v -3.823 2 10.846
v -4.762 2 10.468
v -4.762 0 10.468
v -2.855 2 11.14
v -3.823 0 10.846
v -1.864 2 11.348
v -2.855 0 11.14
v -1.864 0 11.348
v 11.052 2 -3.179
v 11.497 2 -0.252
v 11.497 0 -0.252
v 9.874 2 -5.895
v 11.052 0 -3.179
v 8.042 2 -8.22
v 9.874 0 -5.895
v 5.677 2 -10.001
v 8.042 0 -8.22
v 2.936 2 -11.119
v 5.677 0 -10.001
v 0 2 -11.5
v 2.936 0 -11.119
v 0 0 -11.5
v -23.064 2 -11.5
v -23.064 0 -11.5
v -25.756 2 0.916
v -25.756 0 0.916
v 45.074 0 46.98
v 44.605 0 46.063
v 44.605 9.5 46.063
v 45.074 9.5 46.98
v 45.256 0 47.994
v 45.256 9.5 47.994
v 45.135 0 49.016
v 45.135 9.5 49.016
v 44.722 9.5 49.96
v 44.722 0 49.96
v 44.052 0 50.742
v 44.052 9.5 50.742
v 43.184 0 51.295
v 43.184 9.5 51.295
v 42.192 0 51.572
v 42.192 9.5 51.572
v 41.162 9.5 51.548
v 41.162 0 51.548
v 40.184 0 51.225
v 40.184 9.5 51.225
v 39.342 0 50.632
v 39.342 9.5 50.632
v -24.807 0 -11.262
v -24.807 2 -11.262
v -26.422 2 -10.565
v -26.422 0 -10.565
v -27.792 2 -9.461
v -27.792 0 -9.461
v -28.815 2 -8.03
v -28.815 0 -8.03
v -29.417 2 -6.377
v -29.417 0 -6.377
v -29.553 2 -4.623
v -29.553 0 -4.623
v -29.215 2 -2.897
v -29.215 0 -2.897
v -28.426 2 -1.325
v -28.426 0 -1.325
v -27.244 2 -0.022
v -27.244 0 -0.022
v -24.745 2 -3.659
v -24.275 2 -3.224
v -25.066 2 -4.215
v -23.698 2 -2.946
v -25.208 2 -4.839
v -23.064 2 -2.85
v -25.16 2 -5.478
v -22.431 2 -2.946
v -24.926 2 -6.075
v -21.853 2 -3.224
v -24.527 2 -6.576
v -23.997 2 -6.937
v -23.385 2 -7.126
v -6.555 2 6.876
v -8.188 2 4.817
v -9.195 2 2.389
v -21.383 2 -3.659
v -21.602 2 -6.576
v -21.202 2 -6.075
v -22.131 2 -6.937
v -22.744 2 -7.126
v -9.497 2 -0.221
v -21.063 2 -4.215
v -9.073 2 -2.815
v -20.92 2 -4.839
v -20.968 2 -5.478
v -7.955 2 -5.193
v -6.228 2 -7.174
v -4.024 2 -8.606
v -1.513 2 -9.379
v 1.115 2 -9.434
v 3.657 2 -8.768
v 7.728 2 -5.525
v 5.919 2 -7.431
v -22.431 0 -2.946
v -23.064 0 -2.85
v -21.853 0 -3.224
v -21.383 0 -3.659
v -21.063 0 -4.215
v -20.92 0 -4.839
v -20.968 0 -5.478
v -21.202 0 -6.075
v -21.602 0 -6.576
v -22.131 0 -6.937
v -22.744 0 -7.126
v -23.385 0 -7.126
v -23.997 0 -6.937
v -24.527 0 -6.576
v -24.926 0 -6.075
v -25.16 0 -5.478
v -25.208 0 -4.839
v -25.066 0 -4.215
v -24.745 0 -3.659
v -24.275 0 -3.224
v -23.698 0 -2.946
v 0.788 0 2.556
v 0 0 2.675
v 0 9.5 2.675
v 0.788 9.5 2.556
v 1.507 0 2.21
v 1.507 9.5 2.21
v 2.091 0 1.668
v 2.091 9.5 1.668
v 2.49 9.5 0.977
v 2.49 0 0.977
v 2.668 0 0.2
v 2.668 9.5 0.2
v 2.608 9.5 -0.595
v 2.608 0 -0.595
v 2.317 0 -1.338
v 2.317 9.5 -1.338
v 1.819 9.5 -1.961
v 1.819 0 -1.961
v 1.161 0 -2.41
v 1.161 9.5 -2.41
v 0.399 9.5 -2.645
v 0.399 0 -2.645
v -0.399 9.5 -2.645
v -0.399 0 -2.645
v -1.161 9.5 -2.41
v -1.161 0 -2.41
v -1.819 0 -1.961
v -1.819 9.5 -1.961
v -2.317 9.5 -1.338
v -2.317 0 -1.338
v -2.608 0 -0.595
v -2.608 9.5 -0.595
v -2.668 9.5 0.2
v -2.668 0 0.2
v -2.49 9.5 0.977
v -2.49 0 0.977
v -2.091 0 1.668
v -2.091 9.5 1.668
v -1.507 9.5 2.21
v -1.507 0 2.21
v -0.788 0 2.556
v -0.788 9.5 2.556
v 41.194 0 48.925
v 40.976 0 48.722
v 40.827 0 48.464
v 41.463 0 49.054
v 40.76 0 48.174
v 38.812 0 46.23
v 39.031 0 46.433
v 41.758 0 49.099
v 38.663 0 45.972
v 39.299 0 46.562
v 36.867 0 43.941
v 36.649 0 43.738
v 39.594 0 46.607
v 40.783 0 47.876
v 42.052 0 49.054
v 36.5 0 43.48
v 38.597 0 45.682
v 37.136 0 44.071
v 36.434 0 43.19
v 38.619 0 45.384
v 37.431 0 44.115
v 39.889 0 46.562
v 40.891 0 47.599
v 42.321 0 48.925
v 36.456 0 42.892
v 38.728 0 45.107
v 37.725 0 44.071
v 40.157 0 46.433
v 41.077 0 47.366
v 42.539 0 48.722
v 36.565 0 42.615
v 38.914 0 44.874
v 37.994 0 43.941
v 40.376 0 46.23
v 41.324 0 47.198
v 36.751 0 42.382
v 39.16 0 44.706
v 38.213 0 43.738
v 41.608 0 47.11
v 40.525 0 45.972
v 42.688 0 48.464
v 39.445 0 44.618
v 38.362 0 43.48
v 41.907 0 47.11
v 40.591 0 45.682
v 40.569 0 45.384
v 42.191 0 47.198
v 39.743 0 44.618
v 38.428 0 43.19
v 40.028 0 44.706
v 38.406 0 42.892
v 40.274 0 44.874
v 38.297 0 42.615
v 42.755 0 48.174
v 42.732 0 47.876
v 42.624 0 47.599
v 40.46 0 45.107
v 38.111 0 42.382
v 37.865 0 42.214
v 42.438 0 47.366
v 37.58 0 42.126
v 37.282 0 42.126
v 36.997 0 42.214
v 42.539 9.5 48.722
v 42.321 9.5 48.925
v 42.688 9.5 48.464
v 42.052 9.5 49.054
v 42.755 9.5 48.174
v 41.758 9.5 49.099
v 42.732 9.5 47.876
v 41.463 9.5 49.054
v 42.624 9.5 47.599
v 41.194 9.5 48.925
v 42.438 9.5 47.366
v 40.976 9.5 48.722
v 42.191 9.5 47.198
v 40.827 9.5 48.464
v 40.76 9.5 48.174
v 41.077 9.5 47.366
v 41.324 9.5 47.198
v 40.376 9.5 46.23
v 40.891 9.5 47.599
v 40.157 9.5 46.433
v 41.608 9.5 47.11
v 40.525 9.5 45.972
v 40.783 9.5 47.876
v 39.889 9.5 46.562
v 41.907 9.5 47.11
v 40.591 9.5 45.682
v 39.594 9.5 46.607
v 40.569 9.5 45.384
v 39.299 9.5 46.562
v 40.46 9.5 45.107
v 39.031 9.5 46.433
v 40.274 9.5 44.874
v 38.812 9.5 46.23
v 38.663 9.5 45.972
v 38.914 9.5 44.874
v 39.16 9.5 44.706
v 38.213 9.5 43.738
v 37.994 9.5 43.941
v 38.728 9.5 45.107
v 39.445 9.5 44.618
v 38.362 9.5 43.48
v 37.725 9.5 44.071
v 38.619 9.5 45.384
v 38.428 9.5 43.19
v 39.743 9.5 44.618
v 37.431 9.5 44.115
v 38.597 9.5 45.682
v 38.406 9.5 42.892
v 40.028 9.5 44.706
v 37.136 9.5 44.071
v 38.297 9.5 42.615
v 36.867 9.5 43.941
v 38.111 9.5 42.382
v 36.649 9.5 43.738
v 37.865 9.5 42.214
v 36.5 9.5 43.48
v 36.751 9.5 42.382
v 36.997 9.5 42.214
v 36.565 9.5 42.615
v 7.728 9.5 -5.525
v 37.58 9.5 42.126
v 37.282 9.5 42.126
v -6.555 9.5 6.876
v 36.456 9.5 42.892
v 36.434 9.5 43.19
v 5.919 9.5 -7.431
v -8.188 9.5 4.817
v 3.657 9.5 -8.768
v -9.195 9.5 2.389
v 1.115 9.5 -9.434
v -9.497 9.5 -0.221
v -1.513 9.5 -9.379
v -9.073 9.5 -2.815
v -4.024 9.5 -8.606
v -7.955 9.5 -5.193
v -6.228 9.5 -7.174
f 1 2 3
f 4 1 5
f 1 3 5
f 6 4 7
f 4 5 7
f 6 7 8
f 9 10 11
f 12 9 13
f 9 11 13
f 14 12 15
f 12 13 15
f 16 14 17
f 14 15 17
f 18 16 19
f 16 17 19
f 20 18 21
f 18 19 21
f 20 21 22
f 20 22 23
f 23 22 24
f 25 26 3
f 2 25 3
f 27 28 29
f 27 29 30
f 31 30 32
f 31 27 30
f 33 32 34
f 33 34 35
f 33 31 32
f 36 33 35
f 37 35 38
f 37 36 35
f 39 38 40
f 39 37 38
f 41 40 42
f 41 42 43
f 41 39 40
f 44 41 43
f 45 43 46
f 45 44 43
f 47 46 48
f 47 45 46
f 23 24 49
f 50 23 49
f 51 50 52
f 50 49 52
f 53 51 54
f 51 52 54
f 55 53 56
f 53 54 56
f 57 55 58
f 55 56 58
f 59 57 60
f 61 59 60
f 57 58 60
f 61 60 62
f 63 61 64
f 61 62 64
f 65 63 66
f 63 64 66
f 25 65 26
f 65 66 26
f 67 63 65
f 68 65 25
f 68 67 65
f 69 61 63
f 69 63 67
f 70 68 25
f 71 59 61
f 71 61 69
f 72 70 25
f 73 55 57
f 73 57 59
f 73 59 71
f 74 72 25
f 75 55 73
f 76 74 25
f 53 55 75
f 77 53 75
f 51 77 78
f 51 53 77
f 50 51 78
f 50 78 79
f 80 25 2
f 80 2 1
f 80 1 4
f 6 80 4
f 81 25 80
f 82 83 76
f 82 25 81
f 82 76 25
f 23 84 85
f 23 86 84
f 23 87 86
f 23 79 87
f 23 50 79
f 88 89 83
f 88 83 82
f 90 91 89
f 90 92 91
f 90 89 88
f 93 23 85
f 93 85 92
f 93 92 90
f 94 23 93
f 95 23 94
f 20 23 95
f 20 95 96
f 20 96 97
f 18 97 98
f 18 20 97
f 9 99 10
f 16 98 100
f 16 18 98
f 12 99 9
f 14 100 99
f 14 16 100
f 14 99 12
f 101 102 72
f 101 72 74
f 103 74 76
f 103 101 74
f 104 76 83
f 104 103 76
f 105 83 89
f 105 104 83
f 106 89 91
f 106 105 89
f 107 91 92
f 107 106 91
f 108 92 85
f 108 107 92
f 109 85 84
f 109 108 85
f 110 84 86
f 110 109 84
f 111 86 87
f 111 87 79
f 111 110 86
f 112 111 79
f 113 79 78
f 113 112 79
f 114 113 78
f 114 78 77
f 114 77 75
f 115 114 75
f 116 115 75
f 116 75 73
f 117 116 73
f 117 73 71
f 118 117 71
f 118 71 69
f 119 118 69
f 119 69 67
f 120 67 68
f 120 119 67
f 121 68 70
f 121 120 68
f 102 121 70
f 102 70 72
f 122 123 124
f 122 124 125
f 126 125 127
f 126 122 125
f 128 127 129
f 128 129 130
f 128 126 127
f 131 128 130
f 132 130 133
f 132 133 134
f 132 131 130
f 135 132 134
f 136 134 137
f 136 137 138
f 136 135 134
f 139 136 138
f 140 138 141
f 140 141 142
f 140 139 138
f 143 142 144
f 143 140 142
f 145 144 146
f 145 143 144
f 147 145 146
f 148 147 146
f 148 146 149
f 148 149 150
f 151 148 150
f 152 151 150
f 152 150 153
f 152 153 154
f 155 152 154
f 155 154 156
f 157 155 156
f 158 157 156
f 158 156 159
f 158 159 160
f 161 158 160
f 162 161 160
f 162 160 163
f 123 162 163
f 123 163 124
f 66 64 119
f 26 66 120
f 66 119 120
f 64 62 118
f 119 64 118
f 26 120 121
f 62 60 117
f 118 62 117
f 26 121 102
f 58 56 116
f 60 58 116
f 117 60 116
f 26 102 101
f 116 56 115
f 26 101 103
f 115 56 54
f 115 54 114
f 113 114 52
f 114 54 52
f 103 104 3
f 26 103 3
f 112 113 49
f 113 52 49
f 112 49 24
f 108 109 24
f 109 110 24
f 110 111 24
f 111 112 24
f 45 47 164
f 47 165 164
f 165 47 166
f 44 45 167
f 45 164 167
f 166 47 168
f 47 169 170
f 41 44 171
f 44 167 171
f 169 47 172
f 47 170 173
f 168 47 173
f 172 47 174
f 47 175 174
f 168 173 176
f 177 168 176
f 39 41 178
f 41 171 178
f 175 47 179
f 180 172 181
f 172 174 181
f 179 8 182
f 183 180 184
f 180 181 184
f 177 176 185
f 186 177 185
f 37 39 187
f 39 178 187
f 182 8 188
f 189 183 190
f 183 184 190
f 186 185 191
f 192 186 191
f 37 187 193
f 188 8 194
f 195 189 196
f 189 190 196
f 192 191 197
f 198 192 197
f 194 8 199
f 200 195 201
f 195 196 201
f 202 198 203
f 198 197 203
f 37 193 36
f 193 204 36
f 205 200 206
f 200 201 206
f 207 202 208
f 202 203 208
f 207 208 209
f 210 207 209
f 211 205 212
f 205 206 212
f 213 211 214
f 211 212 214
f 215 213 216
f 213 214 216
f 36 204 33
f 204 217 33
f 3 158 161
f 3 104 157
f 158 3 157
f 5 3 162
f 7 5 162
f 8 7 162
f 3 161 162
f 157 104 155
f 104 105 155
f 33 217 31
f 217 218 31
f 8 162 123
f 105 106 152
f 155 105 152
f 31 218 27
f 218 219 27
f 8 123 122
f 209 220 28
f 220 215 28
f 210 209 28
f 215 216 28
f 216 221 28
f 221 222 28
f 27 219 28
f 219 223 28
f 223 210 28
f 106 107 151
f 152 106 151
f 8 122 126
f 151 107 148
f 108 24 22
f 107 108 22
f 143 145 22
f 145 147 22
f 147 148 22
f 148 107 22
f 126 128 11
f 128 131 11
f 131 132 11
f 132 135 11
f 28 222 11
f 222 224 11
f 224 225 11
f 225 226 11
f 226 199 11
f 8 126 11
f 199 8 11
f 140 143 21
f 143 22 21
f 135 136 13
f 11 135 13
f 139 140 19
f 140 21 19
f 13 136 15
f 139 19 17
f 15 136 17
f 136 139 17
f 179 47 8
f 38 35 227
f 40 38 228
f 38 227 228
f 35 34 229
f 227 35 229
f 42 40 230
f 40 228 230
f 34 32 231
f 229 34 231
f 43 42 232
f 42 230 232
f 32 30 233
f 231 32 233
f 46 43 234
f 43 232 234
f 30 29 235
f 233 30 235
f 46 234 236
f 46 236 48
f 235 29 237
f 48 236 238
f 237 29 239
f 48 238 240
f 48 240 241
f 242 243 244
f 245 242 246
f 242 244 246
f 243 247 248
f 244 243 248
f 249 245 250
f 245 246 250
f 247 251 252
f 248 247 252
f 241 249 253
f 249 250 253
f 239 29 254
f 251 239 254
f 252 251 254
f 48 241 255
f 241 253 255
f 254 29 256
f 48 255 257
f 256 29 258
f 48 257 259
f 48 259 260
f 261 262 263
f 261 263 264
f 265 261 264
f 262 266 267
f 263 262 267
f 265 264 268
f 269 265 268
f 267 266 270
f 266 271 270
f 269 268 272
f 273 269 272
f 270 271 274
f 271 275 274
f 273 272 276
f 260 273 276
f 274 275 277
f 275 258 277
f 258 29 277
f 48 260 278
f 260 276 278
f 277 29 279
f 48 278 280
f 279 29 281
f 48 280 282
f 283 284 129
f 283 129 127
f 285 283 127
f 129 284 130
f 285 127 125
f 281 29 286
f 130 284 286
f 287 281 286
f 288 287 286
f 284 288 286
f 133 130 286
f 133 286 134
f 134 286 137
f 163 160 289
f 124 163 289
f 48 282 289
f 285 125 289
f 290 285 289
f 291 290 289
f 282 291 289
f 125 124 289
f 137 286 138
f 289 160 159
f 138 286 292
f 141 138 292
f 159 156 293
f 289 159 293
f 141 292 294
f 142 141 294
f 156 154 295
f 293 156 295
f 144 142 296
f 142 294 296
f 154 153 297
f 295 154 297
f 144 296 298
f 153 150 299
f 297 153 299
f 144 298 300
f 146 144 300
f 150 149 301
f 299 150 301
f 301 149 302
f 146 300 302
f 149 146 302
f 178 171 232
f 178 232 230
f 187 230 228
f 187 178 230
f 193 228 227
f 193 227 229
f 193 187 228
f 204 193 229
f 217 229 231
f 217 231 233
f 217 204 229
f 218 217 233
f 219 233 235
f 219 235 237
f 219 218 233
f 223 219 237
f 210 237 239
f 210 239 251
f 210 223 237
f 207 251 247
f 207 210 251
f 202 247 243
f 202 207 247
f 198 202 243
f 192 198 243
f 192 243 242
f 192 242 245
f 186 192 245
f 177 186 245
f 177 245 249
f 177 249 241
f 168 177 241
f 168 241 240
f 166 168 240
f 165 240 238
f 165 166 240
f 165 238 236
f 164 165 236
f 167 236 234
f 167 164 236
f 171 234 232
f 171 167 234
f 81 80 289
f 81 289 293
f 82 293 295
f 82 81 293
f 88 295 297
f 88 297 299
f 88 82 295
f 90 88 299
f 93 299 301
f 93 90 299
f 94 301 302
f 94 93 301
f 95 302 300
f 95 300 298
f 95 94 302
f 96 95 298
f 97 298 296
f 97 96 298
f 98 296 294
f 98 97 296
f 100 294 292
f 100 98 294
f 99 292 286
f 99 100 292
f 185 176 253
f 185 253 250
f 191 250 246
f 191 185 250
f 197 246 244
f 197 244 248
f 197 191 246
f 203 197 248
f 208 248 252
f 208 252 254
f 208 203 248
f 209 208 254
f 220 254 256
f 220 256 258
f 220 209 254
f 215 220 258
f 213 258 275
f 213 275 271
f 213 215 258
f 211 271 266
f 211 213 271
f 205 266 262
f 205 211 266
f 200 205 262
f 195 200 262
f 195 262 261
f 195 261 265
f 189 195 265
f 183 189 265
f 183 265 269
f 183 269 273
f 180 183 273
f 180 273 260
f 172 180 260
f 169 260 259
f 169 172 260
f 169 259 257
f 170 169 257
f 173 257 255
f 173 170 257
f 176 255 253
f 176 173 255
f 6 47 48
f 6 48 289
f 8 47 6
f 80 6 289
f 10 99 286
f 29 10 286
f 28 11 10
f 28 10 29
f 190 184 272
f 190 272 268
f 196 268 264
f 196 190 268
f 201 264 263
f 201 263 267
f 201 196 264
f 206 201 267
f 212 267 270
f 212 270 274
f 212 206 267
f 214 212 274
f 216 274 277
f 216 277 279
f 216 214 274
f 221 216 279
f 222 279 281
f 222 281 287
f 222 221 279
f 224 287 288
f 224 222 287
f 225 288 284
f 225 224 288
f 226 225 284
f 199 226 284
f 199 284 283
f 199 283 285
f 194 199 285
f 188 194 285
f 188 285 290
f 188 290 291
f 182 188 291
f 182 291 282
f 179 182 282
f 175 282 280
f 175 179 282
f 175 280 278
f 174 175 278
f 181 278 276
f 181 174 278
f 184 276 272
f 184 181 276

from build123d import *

# Parameters (mm, degrees)
ESQUISSE1_R             = 2.675
ESQUISSE1_R_2           = 2.15
BOSS_EXTRU_1_DEPTH      = 2
BOSS_EXTRU_2_DEPTH      = 7.5
BOSS_EXTRU_2_DEPTH_BACK = 2
ESQUISSE2_R             = 2.675
ESQUISSE2_R_2           = 1


with BuildPart() as part:
    # Esquisse1 → Boss.-Extru.1 (new body)
    with BuildSketch(Plane(origin=(0, 0, 0), x_dir=(1, 0, 0), z_dir=(0, 1, 0))):
        with BuildLine():
            Line((0, 11.5), (-23.064258063, 11.5))
            ThreePointArc((-23.064258063, 11.5), (-29.416702021, 6.377118644), (-25.755971605, -0.916475151))
            Line((-25.755971605, -0.916475151), (-4.76226242, -10.467609882))
            ThreePointArc((-4.76226242, -10.467609882), (11.23893931, -2.436440678), (0, 11.5))
        make_face()
        with Locations(Location((0, 0, 0), (0, 0, 270))):
            Circle(ESQUISSE1_R, mode=Mode.SUBTRACT)
        with Locations(Location((-23.064258063, 5, 0), (0, 0, 270))):
            Circle(ESQUISSE1_R_2, mode=Mode.SUBTRACT)
    extrude(amount=BOSS_EXTRU_1_DEPTH)

    # Esquisse2 → Boss.-Extru.2 (add, two sides: drawn at the far end of the back side and taken through both)
    with BuildSketch(Plane(origin=(0, 2, 0), x_dir=(1, 0, 0), z_dir=(0, 1, 0)).offset(-BOSS_EXTRU_2_DEPTH_BACK)):
        with BuildLine():
            Line((7.728498539, 5.524519013), (44.604848398, -46.063468165))
            ThreePointArc((44.604848398, -46.063468165), (44.052017955, -50.741773707), (39.342439126, -50.632085515))
            Line((39.342439126, -50.632085515), (-6.555183772, -6.876013796))
            ThreePointArc((-6.555183772, -6.876013796), (-6.227958764, 7.173738888), (7.728498539, 5.524519013))
        make_face()
        with Locations(Location((0, 0, 0), (0, 0, 270))):
            Circle(ESQUISSE2_R, mode=Mode.SUBTRACT)
        with Locations(Location((41.757506831, -48.098817275, 0), (0, 0, 270))):
            Circle(ESQUISSE2_R_2, mode=Mode.SUBTRACT)
        with Locations(Location((39.594110629, -45.606886924, 0), (0, 0, 270))):
            Circle(ESQUISSE2_R_2, mode=Mode.SUBTRACT)
        with Locations(Location((37.430714426, -43.114956574, 0), (0, 0, 270))):
            Circle(ESQUISSE2_R_2, mode=Mode.SUBTRACT)
    extrude(amount=BOSS_EXTRU_2_DEPTH + BOSS_EXTRU_2_DEPTH_BACK)


solid = part.part
